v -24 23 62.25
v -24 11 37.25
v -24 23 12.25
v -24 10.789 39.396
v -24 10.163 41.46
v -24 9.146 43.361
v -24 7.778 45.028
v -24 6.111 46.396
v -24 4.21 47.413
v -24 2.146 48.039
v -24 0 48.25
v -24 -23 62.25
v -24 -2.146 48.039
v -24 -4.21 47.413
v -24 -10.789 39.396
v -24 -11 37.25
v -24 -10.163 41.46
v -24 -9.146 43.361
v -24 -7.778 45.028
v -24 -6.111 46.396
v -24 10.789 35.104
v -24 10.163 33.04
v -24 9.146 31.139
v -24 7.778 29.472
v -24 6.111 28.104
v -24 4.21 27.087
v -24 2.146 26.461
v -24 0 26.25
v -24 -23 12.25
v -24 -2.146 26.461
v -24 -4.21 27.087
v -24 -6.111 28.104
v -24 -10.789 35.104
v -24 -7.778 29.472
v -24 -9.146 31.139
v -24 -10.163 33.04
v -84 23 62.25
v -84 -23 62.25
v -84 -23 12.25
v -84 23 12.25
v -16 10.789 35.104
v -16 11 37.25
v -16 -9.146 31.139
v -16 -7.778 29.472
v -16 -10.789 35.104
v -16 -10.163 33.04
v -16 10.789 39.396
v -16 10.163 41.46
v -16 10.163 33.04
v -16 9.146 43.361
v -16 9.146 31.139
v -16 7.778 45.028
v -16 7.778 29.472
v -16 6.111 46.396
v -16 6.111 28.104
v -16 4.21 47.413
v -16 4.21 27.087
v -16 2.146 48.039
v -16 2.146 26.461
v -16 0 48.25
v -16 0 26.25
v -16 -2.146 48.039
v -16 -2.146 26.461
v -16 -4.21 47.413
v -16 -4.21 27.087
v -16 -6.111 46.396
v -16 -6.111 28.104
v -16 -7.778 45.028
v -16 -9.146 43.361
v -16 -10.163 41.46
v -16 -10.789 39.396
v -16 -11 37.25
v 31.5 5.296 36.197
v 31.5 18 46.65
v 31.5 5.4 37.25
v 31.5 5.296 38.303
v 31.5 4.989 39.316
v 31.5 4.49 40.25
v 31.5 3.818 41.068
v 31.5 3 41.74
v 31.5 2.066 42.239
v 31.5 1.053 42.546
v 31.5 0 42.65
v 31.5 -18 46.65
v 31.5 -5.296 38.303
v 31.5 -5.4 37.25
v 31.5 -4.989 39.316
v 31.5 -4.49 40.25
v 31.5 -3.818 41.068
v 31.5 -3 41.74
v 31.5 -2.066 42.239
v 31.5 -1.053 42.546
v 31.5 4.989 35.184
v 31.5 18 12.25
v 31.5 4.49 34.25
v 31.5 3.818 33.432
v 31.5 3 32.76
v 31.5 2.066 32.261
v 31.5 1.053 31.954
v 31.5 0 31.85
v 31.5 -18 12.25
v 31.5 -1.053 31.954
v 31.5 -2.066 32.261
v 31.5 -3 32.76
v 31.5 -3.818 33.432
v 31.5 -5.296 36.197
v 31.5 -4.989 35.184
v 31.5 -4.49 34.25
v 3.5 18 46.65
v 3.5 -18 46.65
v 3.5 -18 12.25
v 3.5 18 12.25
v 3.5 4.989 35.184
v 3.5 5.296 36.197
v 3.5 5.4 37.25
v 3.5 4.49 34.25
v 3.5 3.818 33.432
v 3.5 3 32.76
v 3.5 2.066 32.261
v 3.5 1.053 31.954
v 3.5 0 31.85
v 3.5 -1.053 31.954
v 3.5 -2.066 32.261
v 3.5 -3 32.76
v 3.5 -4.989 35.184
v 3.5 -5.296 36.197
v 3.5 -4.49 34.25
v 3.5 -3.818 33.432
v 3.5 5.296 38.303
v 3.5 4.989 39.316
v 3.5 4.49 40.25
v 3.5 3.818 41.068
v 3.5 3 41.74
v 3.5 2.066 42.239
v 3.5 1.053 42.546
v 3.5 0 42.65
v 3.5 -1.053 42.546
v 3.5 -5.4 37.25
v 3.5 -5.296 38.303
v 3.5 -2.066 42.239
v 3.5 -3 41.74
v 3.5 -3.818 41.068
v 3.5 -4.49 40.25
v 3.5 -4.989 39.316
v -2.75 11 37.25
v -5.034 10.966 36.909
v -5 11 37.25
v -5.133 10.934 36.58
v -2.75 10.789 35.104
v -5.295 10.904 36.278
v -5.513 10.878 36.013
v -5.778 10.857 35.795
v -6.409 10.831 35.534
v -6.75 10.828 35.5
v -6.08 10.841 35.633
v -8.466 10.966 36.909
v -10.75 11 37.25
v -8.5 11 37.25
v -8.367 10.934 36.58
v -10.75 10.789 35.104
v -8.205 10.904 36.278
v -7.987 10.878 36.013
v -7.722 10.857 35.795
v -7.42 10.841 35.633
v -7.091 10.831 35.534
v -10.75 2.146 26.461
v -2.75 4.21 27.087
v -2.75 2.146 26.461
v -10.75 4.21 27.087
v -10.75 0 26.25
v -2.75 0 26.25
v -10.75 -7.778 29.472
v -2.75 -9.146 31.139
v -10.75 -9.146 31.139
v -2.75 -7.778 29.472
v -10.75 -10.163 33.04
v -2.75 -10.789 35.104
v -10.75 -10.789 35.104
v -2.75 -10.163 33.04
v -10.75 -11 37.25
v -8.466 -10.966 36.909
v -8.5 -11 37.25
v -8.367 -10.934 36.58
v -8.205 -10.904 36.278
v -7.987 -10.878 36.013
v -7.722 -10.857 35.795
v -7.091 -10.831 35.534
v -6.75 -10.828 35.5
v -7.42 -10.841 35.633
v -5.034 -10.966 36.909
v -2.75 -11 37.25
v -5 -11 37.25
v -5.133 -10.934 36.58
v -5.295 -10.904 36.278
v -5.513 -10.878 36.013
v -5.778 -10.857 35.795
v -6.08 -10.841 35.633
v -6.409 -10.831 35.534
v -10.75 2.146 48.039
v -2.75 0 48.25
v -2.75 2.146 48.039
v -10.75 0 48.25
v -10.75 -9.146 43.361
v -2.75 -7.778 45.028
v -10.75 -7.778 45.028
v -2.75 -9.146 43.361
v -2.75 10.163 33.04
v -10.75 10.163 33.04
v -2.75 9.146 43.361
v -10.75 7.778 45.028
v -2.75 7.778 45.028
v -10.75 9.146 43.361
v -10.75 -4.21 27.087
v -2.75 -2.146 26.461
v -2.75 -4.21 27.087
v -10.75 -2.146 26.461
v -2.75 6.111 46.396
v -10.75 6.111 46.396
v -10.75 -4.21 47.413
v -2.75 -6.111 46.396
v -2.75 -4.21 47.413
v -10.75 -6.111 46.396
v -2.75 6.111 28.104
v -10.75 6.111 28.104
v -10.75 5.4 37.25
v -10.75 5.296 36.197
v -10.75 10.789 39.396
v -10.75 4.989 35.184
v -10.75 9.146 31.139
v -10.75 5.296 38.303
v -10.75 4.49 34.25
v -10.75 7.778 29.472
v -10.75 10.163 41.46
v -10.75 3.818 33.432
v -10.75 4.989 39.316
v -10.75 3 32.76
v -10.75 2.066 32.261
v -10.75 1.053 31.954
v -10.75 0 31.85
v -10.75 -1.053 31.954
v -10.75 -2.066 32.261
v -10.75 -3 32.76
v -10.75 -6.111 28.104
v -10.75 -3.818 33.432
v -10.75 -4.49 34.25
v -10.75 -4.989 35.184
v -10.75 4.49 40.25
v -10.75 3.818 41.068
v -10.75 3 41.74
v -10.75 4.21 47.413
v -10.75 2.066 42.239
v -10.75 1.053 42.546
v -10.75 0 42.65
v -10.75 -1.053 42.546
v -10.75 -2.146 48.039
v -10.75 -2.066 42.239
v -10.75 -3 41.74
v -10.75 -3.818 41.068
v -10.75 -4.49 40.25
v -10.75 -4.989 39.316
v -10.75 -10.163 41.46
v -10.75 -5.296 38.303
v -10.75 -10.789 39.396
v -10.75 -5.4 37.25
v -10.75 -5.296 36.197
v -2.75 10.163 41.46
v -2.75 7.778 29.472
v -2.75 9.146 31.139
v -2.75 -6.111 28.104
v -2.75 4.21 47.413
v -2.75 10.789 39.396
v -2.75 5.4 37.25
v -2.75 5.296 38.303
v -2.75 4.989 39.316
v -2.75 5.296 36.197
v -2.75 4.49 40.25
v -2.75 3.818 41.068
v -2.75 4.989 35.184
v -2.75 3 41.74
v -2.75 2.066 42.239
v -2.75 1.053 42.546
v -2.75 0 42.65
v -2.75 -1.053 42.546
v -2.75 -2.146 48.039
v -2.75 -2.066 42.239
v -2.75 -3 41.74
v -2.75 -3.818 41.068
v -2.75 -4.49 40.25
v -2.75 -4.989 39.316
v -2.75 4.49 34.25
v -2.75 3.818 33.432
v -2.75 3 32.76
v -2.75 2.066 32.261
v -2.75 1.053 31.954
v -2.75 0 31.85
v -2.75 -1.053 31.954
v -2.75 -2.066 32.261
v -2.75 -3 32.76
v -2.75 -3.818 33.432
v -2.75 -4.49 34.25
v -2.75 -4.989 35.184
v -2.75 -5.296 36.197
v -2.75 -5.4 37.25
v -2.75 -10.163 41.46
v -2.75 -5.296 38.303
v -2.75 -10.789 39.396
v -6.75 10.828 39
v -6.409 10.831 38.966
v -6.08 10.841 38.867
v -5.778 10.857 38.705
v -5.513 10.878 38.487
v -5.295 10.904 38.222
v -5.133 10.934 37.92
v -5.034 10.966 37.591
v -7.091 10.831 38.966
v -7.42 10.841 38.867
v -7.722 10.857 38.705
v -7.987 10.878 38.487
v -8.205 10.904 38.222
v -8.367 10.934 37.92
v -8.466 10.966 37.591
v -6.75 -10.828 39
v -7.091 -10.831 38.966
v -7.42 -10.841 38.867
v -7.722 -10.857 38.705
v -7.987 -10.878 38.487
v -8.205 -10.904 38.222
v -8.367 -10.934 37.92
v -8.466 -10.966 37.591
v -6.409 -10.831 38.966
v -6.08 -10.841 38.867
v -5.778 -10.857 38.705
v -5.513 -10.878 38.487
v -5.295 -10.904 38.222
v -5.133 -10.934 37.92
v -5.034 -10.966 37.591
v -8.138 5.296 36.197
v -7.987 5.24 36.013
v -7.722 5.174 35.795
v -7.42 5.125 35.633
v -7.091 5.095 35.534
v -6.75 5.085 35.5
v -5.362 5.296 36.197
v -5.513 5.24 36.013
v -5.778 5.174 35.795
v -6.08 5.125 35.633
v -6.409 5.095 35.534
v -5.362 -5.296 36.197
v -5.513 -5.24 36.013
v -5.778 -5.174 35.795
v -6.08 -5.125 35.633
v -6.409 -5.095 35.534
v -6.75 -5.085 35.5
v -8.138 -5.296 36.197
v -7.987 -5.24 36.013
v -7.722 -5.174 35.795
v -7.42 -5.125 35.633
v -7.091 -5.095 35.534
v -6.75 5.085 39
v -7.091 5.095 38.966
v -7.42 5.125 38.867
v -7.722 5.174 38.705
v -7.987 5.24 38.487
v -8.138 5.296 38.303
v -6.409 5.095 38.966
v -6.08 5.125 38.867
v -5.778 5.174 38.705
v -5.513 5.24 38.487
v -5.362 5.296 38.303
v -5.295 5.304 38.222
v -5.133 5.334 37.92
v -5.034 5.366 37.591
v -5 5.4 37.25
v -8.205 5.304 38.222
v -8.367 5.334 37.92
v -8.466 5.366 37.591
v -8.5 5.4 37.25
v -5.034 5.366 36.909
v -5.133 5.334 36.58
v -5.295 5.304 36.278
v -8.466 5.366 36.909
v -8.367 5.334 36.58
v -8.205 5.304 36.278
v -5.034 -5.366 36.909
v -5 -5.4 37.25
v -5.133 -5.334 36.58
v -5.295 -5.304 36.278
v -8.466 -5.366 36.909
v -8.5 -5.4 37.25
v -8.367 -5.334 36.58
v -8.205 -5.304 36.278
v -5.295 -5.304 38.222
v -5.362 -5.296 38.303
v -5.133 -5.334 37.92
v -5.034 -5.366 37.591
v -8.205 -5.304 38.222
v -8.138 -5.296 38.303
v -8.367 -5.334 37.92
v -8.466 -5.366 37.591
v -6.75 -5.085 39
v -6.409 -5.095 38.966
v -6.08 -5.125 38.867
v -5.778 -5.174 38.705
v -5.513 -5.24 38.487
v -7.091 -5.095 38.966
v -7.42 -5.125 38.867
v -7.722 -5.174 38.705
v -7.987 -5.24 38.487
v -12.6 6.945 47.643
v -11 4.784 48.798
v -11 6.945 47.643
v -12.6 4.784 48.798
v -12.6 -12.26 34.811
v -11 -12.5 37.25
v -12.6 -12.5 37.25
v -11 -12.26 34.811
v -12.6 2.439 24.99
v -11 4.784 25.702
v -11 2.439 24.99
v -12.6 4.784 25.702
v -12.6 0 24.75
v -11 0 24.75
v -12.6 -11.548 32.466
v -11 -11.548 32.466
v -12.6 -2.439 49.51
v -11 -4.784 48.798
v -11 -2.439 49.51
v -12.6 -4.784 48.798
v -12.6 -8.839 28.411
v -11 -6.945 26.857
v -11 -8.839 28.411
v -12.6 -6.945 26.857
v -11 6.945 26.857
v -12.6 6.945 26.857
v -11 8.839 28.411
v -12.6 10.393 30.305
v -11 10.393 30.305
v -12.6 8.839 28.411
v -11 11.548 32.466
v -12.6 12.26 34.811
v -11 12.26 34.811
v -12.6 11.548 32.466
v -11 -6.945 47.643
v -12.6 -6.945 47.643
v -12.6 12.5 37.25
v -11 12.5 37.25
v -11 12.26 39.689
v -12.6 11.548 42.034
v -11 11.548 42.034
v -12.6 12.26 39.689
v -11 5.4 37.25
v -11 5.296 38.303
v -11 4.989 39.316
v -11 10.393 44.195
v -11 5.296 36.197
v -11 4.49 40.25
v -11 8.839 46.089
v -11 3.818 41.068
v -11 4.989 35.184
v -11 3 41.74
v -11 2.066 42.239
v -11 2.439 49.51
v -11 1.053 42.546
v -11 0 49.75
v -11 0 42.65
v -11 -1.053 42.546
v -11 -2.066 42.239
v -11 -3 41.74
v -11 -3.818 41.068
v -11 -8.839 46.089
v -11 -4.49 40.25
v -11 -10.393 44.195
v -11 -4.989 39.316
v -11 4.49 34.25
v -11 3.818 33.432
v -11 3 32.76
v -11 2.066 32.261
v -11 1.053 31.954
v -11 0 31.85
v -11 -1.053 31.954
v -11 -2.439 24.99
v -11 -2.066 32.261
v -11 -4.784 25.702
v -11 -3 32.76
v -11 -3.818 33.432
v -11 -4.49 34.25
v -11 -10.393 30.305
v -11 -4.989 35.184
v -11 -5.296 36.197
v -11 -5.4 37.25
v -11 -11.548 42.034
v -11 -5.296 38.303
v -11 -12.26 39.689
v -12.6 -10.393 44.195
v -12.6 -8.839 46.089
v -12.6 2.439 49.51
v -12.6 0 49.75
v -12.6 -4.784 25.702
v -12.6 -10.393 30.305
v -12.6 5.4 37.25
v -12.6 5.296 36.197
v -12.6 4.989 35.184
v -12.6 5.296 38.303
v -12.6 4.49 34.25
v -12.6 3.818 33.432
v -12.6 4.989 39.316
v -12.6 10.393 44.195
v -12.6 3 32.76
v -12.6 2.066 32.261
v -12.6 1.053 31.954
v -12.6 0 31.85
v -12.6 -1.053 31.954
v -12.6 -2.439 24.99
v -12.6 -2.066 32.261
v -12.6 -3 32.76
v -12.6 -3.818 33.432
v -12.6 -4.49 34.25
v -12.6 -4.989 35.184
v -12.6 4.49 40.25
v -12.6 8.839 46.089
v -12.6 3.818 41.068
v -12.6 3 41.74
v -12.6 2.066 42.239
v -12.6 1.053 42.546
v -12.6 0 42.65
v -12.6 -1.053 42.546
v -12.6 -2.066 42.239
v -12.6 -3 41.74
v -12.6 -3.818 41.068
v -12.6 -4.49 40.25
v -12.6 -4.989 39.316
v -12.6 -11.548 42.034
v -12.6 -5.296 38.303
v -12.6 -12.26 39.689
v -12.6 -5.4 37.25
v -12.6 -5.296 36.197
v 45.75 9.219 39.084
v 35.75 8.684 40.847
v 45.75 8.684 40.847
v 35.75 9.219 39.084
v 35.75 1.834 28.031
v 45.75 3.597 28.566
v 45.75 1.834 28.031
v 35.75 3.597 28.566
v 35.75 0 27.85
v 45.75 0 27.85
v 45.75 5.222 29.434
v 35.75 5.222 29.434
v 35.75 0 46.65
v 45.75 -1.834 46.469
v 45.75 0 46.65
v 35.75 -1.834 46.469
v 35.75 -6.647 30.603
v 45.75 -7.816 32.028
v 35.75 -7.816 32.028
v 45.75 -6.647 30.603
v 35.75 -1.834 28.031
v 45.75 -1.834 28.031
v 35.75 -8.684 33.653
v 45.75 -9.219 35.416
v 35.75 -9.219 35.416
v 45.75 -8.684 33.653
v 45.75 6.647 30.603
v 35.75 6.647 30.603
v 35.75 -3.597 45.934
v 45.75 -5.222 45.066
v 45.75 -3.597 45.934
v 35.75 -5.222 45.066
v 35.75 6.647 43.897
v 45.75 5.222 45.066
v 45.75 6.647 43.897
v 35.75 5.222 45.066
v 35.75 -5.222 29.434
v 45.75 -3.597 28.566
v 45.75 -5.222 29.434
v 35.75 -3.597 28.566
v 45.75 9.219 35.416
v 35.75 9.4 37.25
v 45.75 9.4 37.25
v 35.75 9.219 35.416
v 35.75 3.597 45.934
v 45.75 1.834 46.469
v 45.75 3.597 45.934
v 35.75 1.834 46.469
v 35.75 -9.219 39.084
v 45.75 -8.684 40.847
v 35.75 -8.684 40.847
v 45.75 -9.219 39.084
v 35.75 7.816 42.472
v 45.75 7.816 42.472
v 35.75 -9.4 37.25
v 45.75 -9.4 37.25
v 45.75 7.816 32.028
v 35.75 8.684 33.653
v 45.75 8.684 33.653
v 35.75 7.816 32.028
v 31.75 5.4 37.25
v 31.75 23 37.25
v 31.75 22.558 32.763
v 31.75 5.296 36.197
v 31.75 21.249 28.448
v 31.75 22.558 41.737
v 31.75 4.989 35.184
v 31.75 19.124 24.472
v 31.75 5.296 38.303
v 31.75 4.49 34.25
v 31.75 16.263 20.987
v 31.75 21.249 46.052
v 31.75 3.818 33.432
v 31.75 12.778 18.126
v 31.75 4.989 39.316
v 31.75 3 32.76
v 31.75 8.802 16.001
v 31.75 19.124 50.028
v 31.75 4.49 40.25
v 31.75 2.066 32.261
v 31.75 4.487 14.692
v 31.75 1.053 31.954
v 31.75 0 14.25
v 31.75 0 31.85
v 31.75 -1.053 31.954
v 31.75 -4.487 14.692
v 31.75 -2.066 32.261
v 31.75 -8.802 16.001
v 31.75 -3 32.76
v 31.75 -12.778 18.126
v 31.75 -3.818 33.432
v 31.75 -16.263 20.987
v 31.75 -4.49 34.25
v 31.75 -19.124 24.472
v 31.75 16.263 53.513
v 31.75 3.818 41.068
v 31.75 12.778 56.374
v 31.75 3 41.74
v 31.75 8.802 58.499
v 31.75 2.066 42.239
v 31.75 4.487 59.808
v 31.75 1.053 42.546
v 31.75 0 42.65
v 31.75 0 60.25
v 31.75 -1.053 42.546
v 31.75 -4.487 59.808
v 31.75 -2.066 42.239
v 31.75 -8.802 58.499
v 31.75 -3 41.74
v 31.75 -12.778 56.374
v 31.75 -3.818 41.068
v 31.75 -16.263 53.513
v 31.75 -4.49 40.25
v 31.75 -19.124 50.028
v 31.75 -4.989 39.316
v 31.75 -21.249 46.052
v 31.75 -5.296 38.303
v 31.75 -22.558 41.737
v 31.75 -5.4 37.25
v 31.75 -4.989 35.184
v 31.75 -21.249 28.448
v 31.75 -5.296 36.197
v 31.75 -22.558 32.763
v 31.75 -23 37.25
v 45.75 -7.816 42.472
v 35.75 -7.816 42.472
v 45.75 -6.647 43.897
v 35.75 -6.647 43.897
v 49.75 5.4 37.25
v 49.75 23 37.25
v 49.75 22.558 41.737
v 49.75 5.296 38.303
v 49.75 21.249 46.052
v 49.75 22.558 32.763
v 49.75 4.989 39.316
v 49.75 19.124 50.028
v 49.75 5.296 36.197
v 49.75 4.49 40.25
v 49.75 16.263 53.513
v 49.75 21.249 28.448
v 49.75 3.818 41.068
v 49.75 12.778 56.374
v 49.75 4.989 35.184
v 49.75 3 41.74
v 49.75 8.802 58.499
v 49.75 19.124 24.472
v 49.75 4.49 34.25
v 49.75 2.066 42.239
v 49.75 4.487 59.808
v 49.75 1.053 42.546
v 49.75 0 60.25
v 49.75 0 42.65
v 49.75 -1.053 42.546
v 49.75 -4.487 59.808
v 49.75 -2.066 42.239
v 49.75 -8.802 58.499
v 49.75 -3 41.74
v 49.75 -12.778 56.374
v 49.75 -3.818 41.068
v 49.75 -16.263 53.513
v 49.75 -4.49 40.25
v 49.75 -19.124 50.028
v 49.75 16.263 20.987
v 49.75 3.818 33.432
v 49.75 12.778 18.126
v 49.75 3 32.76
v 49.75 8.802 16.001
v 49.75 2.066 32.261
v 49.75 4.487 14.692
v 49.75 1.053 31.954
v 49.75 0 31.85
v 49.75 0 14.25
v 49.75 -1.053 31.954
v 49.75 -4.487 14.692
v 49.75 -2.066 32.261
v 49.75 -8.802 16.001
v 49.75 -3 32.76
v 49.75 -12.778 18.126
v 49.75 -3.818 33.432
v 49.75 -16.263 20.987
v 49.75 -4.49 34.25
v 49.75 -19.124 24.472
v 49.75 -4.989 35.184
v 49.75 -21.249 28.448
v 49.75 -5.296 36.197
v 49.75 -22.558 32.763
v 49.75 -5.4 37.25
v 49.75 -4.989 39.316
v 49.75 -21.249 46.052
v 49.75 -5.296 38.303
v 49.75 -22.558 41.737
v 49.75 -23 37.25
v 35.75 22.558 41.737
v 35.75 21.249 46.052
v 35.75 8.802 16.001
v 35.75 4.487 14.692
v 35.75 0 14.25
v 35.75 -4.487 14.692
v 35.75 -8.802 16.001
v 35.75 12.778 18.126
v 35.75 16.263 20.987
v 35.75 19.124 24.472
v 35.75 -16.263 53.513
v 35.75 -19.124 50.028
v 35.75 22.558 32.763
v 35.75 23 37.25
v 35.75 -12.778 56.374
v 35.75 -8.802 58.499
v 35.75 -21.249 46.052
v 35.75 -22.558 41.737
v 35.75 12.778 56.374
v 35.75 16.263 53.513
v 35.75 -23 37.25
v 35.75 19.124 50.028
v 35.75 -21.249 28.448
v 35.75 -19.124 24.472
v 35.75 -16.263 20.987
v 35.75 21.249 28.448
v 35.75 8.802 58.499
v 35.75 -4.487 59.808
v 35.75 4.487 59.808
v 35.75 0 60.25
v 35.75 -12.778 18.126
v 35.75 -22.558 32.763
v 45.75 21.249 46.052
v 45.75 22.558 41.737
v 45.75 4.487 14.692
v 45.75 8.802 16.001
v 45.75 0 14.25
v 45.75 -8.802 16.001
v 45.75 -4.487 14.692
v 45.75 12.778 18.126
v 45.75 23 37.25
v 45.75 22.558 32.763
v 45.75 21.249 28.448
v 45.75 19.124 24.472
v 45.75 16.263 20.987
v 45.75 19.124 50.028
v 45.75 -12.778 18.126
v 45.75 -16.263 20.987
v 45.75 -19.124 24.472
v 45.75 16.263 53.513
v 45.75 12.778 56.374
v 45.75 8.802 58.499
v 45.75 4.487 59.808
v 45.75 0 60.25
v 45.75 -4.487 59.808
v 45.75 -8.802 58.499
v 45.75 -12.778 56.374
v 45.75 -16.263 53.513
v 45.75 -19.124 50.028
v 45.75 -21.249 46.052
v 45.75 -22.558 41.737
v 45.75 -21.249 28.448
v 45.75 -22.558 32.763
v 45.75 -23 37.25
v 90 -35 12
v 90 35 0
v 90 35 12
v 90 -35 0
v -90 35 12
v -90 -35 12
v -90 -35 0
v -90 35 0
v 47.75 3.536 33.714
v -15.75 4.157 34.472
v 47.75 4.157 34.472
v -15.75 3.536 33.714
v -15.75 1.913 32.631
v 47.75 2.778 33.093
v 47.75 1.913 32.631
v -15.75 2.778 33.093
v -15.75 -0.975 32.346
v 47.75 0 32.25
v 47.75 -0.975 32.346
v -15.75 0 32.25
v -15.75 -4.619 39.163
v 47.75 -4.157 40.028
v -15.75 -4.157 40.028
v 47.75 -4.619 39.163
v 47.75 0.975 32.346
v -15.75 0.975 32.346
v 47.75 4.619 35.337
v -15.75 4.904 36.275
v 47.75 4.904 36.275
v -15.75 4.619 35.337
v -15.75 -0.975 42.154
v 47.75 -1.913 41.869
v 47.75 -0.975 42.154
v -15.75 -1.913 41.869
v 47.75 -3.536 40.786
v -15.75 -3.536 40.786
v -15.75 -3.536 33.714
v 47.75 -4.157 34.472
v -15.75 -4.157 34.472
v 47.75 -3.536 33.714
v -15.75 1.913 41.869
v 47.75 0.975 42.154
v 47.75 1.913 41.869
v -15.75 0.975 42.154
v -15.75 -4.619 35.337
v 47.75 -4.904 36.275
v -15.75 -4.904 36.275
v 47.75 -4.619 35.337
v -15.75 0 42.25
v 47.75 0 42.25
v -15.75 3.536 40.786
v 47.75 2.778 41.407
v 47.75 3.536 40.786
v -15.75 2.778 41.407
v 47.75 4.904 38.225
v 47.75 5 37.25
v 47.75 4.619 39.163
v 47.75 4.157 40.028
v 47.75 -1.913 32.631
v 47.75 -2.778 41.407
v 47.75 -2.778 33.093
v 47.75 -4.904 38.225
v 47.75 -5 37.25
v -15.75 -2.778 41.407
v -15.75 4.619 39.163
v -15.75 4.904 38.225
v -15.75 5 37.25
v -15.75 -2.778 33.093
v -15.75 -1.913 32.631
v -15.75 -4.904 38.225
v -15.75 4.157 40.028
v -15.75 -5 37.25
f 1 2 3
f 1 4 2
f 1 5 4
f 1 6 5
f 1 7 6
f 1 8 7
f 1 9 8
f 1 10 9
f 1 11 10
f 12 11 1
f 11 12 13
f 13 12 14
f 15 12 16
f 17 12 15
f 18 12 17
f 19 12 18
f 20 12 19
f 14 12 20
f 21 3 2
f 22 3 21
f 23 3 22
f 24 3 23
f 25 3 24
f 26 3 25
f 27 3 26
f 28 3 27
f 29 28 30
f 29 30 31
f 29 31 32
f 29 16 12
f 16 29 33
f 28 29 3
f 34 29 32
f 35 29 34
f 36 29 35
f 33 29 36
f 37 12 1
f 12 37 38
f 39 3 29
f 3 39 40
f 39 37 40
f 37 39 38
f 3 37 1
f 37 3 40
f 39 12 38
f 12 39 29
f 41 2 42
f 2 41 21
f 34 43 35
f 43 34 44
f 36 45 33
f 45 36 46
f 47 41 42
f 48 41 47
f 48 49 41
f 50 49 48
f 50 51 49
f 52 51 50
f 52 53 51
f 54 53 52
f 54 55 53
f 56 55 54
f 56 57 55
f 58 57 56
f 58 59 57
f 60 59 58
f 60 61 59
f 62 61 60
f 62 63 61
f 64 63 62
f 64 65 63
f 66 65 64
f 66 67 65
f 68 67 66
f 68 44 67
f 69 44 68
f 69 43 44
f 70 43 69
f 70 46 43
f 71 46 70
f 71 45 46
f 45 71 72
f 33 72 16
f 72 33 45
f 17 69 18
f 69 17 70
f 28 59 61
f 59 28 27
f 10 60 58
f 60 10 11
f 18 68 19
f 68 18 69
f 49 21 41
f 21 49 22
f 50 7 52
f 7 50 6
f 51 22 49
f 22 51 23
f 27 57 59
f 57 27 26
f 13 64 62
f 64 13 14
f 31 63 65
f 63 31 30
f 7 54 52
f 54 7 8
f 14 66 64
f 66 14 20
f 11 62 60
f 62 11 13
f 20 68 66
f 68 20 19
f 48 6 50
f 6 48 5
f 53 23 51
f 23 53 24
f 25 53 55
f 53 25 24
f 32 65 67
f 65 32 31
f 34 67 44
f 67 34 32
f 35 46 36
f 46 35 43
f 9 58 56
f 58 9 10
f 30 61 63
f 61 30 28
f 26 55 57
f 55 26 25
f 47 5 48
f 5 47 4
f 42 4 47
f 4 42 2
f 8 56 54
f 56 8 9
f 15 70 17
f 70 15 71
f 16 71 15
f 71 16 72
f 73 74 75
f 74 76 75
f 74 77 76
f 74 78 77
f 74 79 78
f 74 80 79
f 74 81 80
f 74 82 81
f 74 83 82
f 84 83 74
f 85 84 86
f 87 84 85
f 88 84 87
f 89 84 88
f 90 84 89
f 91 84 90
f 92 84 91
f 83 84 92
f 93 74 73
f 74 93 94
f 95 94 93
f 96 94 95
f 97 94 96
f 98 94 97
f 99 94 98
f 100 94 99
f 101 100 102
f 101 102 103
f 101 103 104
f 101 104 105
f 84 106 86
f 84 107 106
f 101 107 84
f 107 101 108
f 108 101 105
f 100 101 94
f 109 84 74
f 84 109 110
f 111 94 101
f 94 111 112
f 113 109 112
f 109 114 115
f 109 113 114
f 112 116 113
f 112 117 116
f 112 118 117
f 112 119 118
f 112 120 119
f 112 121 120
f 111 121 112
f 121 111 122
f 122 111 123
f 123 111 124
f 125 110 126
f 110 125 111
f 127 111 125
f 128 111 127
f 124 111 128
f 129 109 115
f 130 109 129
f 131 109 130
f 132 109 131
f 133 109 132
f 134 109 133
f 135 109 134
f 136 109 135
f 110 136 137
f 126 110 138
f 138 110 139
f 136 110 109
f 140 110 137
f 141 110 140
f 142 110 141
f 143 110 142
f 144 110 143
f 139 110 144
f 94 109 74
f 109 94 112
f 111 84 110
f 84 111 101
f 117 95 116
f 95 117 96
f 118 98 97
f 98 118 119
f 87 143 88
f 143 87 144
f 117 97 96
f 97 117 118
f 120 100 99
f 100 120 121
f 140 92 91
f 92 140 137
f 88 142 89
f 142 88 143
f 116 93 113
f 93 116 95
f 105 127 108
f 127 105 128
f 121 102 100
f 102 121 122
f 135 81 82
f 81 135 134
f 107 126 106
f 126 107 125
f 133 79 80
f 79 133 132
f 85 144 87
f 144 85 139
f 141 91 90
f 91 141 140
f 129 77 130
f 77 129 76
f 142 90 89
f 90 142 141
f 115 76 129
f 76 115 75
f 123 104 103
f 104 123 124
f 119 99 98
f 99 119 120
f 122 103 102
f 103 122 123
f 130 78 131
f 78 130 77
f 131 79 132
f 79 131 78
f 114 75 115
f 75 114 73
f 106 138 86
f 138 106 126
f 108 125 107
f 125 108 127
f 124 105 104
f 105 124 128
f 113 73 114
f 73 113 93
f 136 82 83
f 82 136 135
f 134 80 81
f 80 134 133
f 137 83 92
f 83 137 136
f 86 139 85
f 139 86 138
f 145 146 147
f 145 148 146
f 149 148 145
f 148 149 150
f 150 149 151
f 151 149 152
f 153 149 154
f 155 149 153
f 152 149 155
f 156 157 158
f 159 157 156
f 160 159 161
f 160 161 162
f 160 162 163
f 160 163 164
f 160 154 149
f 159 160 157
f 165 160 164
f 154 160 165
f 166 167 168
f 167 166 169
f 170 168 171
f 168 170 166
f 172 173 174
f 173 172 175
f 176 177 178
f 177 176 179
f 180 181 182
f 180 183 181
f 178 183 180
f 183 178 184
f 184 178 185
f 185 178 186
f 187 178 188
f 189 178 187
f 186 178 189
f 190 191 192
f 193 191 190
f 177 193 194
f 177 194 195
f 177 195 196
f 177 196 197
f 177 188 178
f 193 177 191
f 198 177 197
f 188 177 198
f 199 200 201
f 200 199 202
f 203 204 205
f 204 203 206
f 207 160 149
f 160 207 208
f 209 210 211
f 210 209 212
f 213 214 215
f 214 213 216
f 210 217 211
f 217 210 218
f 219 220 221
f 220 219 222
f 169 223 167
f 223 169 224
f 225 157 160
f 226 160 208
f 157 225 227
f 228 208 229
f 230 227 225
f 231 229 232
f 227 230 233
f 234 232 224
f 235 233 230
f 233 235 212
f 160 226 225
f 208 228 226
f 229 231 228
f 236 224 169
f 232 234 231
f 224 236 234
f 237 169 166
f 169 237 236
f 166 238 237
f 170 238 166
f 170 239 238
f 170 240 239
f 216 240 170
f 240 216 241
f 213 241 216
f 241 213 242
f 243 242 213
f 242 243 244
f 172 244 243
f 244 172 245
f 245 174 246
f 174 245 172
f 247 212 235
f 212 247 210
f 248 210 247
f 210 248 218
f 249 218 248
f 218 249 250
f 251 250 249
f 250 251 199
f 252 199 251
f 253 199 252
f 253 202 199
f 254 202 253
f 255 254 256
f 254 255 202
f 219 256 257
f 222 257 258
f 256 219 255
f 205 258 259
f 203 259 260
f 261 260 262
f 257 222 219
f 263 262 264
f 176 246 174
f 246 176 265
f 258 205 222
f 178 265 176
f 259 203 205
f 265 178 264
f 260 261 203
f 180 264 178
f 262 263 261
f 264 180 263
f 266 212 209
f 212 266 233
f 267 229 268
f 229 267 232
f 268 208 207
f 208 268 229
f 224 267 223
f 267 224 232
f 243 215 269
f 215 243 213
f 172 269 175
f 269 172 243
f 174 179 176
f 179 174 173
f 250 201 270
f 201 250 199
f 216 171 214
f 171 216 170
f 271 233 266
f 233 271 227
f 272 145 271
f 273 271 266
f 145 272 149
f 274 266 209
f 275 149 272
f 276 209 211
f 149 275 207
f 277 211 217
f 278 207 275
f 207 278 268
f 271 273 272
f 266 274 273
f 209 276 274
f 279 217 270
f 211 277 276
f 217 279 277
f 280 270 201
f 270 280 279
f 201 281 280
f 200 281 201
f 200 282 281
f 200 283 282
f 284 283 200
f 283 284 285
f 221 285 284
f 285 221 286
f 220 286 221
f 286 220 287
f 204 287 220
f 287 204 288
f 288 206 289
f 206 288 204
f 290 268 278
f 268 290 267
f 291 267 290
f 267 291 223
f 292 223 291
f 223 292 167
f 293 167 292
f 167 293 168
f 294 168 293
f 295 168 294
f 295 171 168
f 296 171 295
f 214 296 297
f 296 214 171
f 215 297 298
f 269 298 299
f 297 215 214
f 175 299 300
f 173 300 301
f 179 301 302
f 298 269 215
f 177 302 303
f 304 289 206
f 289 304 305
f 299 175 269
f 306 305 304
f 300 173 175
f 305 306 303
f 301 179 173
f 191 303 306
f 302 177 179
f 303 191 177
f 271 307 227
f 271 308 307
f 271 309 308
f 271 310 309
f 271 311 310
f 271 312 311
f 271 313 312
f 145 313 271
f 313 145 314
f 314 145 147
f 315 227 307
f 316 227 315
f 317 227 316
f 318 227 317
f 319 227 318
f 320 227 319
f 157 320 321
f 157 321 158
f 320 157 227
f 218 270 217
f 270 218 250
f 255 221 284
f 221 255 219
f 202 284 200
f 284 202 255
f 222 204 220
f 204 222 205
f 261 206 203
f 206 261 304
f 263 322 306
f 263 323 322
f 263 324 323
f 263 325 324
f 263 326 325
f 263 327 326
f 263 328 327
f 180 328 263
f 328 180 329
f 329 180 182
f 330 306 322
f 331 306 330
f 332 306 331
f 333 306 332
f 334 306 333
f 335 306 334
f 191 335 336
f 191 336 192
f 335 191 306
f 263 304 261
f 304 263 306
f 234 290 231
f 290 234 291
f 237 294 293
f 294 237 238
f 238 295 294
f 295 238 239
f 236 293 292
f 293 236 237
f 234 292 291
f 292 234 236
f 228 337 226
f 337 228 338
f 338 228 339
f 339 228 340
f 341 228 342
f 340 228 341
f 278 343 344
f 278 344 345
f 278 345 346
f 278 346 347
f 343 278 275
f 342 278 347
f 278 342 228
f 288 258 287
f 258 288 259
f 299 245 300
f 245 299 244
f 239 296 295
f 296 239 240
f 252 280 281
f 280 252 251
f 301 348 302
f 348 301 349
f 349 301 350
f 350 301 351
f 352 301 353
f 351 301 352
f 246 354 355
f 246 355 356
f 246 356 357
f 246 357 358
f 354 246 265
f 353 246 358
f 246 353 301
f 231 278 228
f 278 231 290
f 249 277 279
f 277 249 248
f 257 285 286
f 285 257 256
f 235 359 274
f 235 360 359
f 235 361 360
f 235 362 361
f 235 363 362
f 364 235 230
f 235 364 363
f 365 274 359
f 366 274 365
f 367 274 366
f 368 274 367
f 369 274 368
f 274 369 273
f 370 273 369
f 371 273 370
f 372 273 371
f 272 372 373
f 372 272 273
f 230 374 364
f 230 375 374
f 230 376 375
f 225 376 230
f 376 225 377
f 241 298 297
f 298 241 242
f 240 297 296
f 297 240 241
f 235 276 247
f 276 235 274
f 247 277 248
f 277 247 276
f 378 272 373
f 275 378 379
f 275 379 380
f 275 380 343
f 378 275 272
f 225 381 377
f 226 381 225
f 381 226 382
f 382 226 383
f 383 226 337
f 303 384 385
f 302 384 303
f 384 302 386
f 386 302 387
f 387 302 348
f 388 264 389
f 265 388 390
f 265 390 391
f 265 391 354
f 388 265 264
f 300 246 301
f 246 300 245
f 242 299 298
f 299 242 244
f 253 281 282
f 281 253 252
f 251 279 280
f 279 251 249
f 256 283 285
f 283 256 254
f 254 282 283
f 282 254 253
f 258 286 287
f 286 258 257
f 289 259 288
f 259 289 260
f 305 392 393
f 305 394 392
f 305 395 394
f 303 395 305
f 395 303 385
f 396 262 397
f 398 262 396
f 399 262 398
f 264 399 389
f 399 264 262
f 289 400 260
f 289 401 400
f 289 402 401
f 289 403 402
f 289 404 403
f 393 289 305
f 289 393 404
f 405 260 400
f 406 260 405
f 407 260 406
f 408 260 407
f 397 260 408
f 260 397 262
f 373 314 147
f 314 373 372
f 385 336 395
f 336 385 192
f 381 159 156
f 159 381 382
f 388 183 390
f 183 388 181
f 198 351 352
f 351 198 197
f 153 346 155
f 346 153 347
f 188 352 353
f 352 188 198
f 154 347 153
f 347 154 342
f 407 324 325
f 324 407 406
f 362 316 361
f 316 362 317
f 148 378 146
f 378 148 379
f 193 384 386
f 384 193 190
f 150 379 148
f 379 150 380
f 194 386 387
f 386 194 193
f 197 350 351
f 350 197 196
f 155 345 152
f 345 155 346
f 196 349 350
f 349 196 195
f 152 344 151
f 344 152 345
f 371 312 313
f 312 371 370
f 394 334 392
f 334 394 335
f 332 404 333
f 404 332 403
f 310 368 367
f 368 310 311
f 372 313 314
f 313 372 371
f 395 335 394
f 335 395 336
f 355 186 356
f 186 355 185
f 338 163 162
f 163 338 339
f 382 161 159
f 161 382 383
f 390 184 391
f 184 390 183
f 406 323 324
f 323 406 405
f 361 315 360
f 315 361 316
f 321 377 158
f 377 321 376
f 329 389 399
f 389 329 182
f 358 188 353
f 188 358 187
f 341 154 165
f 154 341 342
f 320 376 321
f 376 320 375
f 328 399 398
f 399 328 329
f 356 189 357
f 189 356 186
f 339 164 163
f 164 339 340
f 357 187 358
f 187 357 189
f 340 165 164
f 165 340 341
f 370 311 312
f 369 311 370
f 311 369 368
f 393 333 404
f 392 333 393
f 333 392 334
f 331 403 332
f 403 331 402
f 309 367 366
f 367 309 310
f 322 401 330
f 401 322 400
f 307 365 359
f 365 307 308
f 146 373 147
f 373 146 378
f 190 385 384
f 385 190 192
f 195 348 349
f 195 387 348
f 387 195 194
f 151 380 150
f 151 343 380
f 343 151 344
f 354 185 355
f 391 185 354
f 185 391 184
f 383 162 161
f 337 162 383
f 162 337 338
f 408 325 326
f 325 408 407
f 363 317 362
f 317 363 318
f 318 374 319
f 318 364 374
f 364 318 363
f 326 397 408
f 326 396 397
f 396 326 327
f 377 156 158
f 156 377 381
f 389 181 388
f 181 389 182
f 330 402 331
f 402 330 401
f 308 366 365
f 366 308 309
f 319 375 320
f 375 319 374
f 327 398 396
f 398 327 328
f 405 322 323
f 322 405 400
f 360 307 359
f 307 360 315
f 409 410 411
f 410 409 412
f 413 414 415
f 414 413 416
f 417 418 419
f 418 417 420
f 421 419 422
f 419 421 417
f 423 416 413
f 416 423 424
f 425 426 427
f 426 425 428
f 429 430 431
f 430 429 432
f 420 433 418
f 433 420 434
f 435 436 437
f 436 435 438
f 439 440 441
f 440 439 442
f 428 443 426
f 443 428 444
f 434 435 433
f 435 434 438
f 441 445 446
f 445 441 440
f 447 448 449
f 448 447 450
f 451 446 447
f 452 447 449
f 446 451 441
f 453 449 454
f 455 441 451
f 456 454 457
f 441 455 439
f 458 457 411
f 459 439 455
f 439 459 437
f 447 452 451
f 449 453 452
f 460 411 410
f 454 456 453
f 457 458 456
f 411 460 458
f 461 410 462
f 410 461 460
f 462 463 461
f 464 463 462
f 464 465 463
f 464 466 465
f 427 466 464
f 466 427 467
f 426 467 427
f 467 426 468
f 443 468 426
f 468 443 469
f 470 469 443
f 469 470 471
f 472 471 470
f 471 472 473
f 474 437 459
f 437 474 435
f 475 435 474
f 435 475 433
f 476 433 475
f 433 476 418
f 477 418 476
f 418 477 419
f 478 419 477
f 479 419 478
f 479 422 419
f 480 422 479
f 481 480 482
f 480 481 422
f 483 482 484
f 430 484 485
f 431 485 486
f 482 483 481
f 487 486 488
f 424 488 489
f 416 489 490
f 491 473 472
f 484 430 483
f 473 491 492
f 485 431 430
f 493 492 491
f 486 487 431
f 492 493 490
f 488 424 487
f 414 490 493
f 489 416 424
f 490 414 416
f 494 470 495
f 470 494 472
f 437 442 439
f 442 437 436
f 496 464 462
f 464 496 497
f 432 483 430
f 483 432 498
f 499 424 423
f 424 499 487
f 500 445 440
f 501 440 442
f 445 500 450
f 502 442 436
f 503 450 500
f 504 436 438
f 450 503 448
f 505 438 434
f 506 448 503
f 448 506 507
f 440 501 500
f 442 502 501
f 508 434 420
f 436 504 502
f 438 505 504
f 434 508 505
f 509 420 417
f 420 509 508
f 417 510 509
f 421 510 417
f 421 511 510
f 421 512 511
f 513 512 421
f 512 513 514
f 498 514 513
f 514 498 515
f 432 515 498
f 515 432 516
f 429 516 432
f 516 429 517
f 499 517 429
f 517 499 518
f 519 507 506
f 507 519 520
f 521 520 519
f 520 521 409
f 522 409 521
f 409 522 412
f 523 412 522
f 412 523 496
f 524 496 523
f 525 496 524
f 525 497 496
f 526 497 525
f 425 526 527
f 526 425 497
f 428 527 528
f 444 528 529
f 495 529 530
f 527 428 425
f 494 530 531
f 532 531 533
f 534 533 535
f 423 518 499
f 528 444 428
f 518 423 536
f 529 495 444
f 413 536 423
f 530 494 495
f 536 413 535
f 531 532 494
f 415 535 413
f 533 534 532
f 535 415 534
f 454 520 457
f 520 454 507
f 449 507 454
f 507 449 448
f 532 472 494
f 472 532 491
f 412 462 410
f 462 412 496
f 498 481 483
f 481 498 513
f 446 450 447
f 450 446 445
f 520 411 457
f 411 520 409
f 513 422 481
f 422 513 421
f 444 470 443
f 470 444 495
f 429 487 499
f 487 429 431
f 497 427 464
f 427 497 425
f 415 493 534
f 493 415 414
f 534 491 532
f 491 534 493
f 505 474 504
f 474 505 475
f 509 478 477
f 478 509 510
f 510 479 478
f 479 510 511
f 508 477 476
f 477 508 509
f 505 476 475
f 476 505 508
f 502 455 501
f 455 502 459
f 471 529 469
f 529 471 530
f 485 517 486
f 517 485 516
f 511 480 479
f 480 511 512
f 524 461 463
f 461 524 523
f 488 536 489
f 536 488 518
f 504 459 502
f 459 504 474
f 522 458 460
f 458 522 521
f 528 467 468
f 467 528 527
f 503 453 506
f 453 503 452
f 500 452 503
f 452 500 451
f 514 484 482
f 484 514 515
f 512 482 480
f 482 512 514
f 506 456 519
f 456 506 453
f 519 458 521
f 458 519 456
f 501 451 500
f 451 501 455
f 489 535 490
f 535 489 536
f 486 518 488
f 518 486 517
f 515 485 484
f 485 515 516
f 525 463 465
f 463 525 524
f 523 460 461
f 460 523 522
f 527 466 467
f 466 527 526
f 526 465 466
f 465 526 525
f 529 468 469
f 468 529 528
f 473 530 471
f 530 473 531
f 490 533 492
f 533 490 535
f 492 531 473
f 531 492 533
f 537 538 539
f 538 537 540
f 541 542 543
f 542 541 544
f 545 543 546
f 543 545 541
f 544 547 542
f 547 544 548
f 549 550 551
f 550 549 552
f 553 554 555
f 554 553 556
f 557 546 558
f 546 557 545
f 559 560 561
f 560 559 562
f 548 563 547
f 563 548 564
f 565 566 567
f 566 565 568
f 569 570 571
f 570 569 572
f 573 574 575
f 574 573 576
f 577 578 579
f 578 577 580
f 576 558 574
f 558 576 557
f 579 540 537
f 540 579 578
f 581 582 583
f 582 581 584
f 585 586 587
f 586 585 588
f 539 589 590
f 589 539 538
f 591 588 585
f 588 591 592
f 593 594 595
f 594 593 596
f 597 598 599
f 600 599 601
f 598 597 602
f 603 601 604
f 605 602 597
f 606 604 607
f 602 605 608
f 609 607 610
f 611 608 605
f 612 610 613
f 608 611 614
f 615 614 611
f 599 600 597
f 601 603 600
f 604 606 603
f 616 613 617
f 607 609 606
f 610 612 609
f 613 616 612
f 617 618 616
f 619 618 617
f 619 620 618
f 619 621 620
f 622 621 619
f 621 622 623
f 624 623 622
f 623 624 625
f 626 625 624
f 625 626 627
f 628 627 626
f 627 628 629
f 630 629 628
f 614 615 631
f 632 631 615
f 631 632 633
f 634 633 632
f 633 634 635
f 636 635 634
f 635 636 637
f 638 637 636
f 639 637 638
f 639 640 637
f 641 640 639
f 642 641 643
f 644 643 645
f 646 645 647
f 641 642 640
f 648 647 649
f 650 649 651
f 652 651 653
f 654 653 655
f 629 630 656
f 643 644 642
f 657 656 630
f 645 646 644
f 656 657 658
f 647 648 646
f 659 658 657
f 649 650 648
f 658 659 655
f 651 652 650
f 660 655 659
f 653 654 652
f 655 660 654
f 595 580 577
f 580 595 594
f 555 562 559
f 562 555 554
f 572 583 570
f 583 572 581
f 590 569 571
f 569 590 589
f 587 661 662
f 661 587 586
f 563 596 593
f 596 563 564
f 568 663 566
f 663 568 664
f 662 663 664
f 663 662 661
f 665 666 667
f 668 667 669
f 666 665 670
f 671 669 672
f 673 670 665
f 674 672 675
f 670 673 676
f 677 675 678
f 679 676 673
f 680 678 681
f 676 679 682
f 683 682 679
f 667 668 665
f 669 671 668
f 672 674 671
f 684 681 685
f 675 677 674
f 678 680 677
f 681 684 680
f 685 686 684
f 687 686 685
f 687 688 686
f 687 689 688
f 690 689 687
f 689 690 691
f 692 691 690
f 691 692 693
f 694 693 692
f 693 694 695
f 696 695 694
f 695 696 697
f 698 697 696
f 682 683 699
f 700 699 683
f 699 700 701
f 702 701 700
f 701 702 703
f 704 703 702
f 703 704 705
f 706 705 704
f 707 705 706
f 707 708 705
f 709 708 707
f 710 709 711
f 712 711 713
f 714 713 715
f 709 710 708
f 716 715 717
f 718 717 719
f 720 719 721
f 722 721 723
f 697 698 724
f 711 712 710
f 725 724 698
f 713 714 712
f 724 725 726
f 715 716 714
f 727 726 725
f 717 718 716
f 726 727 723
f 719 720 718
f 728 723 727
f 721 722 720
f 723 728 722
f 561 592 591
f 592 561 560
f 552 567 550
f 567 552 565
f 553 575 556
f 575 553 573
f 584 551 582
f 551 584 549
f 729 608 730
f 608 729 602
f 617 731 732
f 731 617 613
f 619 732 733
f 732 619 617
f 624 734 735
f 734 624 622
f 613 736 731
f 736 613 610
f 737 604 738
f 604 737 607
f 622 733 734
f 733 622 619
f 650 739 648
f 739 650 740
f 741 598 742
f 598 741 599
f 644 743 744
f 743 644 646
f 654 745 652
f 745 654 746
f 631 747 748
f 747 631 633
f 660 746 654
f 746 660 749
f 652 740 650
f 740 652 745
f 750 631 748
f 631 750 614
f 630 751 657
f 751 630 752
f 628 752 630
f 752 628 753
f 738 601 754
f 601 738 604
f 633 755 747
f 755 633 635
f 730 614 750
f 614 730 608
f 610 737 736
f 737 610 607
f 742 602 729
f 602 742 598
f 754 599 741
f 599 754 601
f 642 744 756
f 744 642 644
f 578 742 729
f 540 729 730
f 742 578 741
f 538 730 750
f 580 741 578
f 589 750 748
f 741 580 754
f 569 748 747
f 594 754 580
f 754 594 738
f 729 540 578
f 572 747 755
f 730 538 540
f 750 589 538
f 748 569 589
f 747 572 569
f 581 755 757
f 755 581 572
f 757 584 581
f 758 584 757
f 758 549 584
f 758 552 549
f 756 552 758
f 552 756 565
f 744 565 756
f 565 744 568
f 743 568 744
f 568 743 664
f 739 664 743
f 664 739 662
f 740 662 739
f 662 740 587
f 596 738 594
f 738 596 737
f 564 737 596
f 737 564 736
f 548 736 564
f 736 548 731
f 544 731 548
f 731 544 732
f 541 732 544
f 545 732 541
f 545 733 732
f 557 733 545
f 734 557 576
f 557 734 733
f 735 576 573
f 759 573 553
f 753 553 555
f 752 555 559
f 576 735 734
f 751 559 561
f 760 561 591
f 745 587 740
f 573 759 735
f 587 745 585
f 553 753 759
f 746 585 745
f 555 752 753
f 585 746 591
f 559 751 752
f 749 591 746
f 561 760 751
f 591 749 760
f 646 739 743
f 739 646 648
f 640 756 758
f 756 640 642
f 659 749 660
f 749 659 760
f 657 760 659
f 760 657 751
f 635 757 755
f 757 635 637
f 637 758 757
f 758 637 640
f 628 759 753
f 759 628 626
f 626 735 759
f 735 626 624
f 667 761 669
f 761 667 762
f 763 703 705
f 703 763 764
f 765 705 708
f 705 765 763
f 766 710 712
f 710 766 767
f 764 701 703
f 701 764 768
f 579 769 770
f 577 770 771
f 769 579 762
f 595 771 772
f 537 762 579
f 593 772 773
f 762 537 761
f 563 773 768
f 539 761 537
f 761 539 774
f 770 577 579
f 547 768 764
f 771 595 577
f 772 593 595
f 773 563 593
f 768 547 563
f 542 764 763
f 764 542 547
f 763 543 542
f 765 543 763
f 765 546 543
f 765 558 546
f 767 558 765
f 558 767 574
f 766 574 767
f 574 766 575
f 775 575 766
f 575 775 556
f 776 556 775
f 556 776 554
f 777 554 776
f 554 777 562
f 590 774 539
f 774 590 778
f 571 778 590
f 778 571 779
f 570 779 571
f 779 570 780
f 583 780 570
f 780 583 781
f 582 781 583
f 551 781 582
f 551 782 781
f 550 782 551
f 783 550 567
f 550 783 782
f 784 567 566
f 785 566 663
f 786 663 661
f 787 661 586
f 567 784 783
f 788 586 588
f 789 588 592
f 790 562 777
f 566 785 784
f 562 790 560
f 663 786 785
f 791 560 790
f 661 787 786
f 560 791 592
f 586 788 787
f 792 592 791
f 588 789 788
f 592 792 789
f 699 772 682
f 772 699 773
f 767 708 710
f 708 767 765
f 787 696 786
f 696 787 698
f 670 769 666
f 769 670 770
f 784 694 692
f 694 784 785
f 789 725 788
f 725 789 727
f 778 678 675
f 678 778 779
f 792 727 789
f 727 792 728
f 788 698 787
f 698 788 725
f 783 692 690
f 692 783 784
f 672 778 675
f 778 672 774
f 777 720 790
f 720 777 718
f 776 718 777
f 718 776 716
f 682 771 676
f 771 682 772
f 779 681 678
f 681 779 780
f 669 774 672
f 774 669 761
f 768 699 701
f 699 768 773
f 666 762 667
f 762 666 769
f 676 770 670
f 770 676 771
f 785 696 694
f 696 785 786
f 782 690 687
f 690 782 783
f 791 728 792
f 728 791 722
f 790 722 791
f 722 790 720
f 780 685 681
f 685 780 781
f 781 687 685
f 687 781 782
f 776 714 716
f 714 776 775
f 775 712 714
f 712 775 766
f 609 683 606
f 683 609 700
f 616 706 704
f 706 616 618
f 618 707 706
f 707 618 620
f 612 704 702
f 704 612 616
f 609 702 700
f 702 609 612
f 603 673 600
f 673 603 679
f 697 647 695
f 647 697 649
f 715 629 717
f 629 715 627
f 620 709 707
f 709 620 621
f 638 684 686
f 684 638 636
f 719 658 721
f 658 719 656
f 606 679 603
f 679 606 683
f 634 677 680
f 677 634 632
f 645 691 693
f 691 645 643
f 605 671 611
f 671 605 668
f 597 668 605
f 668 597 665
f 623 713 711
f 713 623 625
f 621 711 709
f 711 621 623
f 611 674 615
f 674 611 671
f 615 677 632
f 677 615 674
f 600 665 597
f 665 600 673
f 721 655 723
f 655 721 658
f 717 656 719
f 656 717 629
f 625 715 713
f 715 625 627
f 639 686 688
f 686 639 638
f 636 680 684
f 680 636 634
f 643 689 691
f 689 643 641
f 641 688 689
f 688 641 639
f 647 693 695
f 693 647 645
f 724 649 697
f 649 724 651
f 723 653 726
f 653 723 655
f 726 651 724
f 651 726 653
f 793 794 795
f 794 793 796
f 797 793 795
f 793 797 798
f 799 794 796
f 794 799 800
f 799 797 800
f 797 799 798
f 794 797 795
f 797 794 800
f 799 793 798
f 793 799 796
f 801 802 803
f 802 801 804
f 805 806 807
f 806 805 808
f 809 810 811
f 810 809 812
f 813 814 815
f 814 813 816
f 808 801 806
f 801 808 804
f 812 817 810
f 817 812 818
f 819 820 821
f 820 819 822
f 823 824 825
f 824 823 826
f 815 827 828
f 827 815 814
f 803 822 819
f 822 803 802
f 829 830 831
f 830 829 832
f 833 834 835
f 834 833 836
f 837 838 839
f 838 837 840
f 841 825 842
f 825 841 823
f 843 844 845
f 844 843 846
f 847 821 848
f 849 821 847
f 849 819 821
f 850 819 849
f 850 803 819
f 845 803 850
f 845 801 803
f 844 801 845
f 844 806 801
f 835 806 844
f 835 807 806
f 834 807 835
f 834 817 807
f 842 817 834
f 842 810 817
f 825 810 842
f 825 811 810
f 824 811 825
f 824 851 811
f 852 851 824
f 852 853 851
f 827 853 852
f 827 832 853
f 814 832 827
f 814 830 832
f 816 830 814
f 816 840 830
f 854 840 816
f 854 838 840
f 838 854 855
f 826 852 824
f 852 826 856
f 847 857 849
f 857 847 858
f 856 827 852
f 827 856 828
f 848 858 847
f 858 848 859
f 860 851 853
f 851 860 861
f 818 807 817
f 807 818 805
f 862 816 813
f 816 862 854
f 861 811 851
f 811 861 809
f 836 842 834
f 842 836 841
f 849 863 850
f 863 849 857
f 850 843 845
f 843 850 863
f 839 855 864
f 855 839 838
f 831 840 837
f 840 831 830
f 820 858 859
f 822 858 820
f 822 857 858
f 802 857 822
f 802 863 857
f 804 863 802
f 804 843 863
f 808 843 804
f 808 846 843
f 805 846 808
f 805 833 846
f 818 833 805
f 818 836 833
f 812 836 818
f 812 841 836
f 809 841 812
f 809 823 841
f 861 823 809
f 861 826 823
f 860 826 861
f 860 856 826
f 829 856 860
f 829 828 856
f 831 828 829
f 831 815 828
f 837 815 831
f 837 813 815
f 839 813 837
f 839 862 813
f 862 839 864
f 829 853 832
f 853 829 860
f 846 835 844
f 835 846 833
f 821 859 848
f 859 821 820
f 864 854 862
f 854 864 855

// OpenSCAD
$fn = 32;

// ------------------------------------------------------------------------
// Motor drive station: motor 60 x 50 mm, shaft d10, pulley d46
// Every part is its own module, assembly() places every instance.
// ------------------------------------------------------------------------

// --- part 1 ---
module station_bed() {
  difference() {
    translate([-90, -35, 0]) cube([180, 70, 12]);
  }
}

// --- part 2 ---
module drive_motor() {
  union() {
    translate([-30, -23, 0]) cube([60, 46, 50]);
    translate([34, 0, 25]) rotate([0, 90, 0]) cylinder(h = 8, d = 22, center = true);
  }
}

// --- part 3 ---
module pillow_block() {
  difference() {
    translate([-14, -18, 0]) cube([28, 36, 34.4]);
    translate([0, 0, 25]) rotate([0, 90, 0]) cylinder(h = 30, d = 10.8, center = true);
  }
}

// --- part 4 ---
module drive_shaft() {
  translate([0, 0, -31.75]) cylinder(h = 63.5, d = 10);
}

// --- part 5 ---
module shaft_collar() {
  difference() {
    cylinder(h = 8, d = 22);
    translate([0, 0, -1]) cylinder(h = 10, d = 10.8);
    translate([0, 0, 4]) rotate([90, 0, 0]) cylinder(h = 24, d = 3.5, center = true);
  }
}

// --- part 6 ---
module collar_washer() {
  difference() {
      translate([0, 0, 0]) cylinder(h = 1.6, d = 25);
      translate([0, 0, -1]) cylinder(h = 3.6, d = 10.8);
    }
}

// --- part 7 ---
module drive_pulley() {
  difference() {
    union() {
      cylinder(h = 18, d = 18.8);
      cylinder(h = 4, d = 46);
      translate([0, 0, 14]) cylinder(h = 4, d = 46);
    }
    translate([0, 0, -1]) cylinder(h = 20, d = 10.8);
  }
}

// --- assembly ---
module assembly() {
  color([0.80, 0.24, 0.20]) translate([0, 0, 0]) rotate([0, 0, 0]) station_bed();
  color([0.20, 0.45, 0.75]) translate([-54, 0, 12.25]) rotate([0, 0, 0]) drive_motor();
  color([0.25, 0.62, 0.32]) translate([17.5, 0, 12.25]) rotate([0, 0, 0]) pillow_block();
  color([0.92, 0.70, 0.18]) translate([16, 0, 37.25]) rotate([0, 90, 0]) drive_shaft();
  color([0.58, 0.35, 0.70]) translate([-10.75, 0, 37.25]) rotate([0, 90, 0]) shaft_collar();
  color([0.16, 0.66, 0.66]) translate([-12.6, 0, 37.25]) rotate([0, 90, 0]) collar_washer();
  color([0.85, 0.48, 0.18]) translate([31.75, 0, 37.25]) rotate([0, 90, 0]) drive_pulley();
}

assembly();
